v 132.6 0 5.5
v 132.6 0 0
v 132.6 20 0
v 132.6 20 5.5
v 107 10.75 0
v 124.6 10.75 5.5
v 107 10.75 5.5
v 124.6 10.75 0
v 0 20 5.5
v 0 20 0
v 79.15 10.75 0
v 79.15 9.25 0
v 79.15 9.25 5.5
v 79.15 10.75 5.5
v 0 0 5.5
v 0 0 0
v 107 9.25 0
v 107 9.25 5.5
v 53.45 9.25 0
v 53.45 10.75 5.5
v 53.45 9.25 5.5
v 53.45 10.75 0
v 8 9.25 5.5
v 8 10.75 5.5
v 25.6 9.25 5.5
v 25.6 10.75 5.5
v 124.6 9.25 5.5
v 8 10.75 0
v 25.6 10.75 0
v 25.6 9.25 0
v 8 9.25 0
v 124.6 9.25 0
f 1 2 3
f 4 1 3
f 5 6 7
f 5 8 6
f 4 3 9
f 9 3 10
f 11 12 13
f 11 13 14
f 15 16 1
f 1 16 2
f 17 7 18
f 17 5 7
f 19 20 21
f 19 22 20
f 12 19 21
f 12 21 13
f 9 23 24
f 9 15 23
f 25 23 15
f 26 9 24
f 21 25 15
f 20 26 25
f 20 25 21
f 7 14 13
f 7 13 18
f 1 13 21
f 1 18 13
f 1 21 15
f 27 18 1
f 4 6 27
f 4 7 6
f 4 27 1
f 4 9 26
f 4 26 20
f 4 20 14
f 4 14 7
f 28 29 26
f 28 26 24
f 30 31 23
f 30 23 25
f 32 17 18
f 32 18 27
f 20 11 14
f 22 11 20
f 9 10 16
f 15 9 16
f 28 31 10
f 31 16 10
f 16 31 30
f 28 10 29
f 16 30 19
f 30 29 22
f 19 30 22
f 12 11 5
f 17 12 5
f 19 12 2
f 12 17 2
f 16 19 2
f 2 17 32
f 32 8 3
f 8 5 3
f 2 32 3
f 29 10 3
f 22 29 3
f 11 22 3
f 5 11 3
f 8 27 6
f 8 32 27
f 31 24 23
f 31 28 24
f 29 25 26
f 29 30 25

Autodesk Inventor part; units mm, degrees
ref_plane "YZ Plane" through (0, 0, 0) normal (1, 0, 0) x (0, 1, 0)
ref_plane "XZ Plane" through (0, 0, 0) normal (0, 1, 0) x (-1, 0, 0)
sketch "Sketch1" plane through (0, 0, 0) normal (0, 0, 1) x (1, 0, 0)
  line L0 (0, 0) -> (132.6, 0)
  line L1 (132.6, 0) -> (132.6, 20)
  line L2 (132.6, 20) -> (0, 20)
  line L3 (0, 20) -> (0, 0)
  line L4 (0, 10) -> (132.6, 10) construction
  line L5 (66.3, 20) -> (66.3, 0) construction
  line L6 (53.45, 9.25) -> (79.15, 9.25)
  line L7 (79.15, 9.25) -> (79.15, 10.75)
  line L8 (79.15, 10.75) -> (53.45, 10.75)
  line L9 (53.45, 10.75) -> (53.45, 9.25)
  line L10 (53.45, 9.25) -> (79.15, 10.75) construction
  line L11 (79.15, 9.25) -> (53.45, 10.75) construction
  line L12 (8, 9.25) -> (25.6, 9.25)
  line L13 (25.6, 9.25) -> (25.6, 10.75)
  line L14 (25.6, 10.75) -> (8, 10.75)
  line L15 (8, 10.75) -> (8, 9.25)
  line L16 (8, 9.25) -> (25.6, 10.75) construction
  line L17 (25.6, 9.25) -> (8, 10.75) construction
  line L18 (107, 9.25) -> (124.6, 9.25)
  line L19 (124.6, 9.25) -> (124.6, 10.75)
  line L20 (124.6, 10.75) -> (107, 10.75)
  line L21 (107, 10.75) -> (107, 9.25)
  line L22 (107, 9.25) -> (124.6, 10.75) construction
  line L23 (124.6, 9.25) -> (107, 10.75) construction
  point P0 (66.3, 10)
  point P1 (16.8, 10)
  point P2 (115.8, 10)
  dimension "d0" = 132.6
  dimension "d1" = 20
  dimension "d2" = 25.7
  dimension "d3" = 1.5
  dimension "d4" = 17.6
  dimension "d5" = 1.5
  dimension "d6" = 49.5
  dimension "d7" = 17.6
  dimension "d8" = 1.5
  dimension "d9" = 49.5
extrude "Extrusion1" add sketch "Sketch1" along normal blind 5.5
ref_plane "Work Plane1" through (0, 10, 0) normal (0, 1, 0) x (1, 0, 0)
ref_plane "Work Plane2" through (66.3, 0, 0) normal (1, 0, 0) x (0, 0, -1)
equation "\"d1\" = midbottomw"
equation "\"d2\" = mmid + toler"
equation "\"d4\" = mlr + toler"
equation "\"d5\" = d3"
equation "\"d6\" = mbetween"
equation "\"d7\" = d4"
equation "\"d8\" = d3"
equation "\"d9\" = d6"
equation "\"thick\" = 0.5"
equation "\"lrlr\" = 19"
equation "\"lrmid\" = 19.9"
equation "\"lrdepth\" = 3.3"
equation "\"mlr\" = 16.6"
equation "\"mmid\" = 24.7"
equation "\"mdepth\" = 4.5"
equation "\"lrltotal\" = 126.6"
equation "\"mltotal\" = 126.6"
equation "\"lrbetween\" = 52.1"
equation "\"mbetween\" = 49.5"
equation "\"toler\" = 1"
equation "\"midbottomw\" = 20"
equation "\"stuckw\" = 6"
equation "\"tight\" = 0.08"
equation "\"sidewallL\" = 132.6"
equation "\"heaterH\" = 117.3"
equation "\"stickL\" = 3.5"
equation "\"wireH\" = 25"
properties part number "mid_bottom"
